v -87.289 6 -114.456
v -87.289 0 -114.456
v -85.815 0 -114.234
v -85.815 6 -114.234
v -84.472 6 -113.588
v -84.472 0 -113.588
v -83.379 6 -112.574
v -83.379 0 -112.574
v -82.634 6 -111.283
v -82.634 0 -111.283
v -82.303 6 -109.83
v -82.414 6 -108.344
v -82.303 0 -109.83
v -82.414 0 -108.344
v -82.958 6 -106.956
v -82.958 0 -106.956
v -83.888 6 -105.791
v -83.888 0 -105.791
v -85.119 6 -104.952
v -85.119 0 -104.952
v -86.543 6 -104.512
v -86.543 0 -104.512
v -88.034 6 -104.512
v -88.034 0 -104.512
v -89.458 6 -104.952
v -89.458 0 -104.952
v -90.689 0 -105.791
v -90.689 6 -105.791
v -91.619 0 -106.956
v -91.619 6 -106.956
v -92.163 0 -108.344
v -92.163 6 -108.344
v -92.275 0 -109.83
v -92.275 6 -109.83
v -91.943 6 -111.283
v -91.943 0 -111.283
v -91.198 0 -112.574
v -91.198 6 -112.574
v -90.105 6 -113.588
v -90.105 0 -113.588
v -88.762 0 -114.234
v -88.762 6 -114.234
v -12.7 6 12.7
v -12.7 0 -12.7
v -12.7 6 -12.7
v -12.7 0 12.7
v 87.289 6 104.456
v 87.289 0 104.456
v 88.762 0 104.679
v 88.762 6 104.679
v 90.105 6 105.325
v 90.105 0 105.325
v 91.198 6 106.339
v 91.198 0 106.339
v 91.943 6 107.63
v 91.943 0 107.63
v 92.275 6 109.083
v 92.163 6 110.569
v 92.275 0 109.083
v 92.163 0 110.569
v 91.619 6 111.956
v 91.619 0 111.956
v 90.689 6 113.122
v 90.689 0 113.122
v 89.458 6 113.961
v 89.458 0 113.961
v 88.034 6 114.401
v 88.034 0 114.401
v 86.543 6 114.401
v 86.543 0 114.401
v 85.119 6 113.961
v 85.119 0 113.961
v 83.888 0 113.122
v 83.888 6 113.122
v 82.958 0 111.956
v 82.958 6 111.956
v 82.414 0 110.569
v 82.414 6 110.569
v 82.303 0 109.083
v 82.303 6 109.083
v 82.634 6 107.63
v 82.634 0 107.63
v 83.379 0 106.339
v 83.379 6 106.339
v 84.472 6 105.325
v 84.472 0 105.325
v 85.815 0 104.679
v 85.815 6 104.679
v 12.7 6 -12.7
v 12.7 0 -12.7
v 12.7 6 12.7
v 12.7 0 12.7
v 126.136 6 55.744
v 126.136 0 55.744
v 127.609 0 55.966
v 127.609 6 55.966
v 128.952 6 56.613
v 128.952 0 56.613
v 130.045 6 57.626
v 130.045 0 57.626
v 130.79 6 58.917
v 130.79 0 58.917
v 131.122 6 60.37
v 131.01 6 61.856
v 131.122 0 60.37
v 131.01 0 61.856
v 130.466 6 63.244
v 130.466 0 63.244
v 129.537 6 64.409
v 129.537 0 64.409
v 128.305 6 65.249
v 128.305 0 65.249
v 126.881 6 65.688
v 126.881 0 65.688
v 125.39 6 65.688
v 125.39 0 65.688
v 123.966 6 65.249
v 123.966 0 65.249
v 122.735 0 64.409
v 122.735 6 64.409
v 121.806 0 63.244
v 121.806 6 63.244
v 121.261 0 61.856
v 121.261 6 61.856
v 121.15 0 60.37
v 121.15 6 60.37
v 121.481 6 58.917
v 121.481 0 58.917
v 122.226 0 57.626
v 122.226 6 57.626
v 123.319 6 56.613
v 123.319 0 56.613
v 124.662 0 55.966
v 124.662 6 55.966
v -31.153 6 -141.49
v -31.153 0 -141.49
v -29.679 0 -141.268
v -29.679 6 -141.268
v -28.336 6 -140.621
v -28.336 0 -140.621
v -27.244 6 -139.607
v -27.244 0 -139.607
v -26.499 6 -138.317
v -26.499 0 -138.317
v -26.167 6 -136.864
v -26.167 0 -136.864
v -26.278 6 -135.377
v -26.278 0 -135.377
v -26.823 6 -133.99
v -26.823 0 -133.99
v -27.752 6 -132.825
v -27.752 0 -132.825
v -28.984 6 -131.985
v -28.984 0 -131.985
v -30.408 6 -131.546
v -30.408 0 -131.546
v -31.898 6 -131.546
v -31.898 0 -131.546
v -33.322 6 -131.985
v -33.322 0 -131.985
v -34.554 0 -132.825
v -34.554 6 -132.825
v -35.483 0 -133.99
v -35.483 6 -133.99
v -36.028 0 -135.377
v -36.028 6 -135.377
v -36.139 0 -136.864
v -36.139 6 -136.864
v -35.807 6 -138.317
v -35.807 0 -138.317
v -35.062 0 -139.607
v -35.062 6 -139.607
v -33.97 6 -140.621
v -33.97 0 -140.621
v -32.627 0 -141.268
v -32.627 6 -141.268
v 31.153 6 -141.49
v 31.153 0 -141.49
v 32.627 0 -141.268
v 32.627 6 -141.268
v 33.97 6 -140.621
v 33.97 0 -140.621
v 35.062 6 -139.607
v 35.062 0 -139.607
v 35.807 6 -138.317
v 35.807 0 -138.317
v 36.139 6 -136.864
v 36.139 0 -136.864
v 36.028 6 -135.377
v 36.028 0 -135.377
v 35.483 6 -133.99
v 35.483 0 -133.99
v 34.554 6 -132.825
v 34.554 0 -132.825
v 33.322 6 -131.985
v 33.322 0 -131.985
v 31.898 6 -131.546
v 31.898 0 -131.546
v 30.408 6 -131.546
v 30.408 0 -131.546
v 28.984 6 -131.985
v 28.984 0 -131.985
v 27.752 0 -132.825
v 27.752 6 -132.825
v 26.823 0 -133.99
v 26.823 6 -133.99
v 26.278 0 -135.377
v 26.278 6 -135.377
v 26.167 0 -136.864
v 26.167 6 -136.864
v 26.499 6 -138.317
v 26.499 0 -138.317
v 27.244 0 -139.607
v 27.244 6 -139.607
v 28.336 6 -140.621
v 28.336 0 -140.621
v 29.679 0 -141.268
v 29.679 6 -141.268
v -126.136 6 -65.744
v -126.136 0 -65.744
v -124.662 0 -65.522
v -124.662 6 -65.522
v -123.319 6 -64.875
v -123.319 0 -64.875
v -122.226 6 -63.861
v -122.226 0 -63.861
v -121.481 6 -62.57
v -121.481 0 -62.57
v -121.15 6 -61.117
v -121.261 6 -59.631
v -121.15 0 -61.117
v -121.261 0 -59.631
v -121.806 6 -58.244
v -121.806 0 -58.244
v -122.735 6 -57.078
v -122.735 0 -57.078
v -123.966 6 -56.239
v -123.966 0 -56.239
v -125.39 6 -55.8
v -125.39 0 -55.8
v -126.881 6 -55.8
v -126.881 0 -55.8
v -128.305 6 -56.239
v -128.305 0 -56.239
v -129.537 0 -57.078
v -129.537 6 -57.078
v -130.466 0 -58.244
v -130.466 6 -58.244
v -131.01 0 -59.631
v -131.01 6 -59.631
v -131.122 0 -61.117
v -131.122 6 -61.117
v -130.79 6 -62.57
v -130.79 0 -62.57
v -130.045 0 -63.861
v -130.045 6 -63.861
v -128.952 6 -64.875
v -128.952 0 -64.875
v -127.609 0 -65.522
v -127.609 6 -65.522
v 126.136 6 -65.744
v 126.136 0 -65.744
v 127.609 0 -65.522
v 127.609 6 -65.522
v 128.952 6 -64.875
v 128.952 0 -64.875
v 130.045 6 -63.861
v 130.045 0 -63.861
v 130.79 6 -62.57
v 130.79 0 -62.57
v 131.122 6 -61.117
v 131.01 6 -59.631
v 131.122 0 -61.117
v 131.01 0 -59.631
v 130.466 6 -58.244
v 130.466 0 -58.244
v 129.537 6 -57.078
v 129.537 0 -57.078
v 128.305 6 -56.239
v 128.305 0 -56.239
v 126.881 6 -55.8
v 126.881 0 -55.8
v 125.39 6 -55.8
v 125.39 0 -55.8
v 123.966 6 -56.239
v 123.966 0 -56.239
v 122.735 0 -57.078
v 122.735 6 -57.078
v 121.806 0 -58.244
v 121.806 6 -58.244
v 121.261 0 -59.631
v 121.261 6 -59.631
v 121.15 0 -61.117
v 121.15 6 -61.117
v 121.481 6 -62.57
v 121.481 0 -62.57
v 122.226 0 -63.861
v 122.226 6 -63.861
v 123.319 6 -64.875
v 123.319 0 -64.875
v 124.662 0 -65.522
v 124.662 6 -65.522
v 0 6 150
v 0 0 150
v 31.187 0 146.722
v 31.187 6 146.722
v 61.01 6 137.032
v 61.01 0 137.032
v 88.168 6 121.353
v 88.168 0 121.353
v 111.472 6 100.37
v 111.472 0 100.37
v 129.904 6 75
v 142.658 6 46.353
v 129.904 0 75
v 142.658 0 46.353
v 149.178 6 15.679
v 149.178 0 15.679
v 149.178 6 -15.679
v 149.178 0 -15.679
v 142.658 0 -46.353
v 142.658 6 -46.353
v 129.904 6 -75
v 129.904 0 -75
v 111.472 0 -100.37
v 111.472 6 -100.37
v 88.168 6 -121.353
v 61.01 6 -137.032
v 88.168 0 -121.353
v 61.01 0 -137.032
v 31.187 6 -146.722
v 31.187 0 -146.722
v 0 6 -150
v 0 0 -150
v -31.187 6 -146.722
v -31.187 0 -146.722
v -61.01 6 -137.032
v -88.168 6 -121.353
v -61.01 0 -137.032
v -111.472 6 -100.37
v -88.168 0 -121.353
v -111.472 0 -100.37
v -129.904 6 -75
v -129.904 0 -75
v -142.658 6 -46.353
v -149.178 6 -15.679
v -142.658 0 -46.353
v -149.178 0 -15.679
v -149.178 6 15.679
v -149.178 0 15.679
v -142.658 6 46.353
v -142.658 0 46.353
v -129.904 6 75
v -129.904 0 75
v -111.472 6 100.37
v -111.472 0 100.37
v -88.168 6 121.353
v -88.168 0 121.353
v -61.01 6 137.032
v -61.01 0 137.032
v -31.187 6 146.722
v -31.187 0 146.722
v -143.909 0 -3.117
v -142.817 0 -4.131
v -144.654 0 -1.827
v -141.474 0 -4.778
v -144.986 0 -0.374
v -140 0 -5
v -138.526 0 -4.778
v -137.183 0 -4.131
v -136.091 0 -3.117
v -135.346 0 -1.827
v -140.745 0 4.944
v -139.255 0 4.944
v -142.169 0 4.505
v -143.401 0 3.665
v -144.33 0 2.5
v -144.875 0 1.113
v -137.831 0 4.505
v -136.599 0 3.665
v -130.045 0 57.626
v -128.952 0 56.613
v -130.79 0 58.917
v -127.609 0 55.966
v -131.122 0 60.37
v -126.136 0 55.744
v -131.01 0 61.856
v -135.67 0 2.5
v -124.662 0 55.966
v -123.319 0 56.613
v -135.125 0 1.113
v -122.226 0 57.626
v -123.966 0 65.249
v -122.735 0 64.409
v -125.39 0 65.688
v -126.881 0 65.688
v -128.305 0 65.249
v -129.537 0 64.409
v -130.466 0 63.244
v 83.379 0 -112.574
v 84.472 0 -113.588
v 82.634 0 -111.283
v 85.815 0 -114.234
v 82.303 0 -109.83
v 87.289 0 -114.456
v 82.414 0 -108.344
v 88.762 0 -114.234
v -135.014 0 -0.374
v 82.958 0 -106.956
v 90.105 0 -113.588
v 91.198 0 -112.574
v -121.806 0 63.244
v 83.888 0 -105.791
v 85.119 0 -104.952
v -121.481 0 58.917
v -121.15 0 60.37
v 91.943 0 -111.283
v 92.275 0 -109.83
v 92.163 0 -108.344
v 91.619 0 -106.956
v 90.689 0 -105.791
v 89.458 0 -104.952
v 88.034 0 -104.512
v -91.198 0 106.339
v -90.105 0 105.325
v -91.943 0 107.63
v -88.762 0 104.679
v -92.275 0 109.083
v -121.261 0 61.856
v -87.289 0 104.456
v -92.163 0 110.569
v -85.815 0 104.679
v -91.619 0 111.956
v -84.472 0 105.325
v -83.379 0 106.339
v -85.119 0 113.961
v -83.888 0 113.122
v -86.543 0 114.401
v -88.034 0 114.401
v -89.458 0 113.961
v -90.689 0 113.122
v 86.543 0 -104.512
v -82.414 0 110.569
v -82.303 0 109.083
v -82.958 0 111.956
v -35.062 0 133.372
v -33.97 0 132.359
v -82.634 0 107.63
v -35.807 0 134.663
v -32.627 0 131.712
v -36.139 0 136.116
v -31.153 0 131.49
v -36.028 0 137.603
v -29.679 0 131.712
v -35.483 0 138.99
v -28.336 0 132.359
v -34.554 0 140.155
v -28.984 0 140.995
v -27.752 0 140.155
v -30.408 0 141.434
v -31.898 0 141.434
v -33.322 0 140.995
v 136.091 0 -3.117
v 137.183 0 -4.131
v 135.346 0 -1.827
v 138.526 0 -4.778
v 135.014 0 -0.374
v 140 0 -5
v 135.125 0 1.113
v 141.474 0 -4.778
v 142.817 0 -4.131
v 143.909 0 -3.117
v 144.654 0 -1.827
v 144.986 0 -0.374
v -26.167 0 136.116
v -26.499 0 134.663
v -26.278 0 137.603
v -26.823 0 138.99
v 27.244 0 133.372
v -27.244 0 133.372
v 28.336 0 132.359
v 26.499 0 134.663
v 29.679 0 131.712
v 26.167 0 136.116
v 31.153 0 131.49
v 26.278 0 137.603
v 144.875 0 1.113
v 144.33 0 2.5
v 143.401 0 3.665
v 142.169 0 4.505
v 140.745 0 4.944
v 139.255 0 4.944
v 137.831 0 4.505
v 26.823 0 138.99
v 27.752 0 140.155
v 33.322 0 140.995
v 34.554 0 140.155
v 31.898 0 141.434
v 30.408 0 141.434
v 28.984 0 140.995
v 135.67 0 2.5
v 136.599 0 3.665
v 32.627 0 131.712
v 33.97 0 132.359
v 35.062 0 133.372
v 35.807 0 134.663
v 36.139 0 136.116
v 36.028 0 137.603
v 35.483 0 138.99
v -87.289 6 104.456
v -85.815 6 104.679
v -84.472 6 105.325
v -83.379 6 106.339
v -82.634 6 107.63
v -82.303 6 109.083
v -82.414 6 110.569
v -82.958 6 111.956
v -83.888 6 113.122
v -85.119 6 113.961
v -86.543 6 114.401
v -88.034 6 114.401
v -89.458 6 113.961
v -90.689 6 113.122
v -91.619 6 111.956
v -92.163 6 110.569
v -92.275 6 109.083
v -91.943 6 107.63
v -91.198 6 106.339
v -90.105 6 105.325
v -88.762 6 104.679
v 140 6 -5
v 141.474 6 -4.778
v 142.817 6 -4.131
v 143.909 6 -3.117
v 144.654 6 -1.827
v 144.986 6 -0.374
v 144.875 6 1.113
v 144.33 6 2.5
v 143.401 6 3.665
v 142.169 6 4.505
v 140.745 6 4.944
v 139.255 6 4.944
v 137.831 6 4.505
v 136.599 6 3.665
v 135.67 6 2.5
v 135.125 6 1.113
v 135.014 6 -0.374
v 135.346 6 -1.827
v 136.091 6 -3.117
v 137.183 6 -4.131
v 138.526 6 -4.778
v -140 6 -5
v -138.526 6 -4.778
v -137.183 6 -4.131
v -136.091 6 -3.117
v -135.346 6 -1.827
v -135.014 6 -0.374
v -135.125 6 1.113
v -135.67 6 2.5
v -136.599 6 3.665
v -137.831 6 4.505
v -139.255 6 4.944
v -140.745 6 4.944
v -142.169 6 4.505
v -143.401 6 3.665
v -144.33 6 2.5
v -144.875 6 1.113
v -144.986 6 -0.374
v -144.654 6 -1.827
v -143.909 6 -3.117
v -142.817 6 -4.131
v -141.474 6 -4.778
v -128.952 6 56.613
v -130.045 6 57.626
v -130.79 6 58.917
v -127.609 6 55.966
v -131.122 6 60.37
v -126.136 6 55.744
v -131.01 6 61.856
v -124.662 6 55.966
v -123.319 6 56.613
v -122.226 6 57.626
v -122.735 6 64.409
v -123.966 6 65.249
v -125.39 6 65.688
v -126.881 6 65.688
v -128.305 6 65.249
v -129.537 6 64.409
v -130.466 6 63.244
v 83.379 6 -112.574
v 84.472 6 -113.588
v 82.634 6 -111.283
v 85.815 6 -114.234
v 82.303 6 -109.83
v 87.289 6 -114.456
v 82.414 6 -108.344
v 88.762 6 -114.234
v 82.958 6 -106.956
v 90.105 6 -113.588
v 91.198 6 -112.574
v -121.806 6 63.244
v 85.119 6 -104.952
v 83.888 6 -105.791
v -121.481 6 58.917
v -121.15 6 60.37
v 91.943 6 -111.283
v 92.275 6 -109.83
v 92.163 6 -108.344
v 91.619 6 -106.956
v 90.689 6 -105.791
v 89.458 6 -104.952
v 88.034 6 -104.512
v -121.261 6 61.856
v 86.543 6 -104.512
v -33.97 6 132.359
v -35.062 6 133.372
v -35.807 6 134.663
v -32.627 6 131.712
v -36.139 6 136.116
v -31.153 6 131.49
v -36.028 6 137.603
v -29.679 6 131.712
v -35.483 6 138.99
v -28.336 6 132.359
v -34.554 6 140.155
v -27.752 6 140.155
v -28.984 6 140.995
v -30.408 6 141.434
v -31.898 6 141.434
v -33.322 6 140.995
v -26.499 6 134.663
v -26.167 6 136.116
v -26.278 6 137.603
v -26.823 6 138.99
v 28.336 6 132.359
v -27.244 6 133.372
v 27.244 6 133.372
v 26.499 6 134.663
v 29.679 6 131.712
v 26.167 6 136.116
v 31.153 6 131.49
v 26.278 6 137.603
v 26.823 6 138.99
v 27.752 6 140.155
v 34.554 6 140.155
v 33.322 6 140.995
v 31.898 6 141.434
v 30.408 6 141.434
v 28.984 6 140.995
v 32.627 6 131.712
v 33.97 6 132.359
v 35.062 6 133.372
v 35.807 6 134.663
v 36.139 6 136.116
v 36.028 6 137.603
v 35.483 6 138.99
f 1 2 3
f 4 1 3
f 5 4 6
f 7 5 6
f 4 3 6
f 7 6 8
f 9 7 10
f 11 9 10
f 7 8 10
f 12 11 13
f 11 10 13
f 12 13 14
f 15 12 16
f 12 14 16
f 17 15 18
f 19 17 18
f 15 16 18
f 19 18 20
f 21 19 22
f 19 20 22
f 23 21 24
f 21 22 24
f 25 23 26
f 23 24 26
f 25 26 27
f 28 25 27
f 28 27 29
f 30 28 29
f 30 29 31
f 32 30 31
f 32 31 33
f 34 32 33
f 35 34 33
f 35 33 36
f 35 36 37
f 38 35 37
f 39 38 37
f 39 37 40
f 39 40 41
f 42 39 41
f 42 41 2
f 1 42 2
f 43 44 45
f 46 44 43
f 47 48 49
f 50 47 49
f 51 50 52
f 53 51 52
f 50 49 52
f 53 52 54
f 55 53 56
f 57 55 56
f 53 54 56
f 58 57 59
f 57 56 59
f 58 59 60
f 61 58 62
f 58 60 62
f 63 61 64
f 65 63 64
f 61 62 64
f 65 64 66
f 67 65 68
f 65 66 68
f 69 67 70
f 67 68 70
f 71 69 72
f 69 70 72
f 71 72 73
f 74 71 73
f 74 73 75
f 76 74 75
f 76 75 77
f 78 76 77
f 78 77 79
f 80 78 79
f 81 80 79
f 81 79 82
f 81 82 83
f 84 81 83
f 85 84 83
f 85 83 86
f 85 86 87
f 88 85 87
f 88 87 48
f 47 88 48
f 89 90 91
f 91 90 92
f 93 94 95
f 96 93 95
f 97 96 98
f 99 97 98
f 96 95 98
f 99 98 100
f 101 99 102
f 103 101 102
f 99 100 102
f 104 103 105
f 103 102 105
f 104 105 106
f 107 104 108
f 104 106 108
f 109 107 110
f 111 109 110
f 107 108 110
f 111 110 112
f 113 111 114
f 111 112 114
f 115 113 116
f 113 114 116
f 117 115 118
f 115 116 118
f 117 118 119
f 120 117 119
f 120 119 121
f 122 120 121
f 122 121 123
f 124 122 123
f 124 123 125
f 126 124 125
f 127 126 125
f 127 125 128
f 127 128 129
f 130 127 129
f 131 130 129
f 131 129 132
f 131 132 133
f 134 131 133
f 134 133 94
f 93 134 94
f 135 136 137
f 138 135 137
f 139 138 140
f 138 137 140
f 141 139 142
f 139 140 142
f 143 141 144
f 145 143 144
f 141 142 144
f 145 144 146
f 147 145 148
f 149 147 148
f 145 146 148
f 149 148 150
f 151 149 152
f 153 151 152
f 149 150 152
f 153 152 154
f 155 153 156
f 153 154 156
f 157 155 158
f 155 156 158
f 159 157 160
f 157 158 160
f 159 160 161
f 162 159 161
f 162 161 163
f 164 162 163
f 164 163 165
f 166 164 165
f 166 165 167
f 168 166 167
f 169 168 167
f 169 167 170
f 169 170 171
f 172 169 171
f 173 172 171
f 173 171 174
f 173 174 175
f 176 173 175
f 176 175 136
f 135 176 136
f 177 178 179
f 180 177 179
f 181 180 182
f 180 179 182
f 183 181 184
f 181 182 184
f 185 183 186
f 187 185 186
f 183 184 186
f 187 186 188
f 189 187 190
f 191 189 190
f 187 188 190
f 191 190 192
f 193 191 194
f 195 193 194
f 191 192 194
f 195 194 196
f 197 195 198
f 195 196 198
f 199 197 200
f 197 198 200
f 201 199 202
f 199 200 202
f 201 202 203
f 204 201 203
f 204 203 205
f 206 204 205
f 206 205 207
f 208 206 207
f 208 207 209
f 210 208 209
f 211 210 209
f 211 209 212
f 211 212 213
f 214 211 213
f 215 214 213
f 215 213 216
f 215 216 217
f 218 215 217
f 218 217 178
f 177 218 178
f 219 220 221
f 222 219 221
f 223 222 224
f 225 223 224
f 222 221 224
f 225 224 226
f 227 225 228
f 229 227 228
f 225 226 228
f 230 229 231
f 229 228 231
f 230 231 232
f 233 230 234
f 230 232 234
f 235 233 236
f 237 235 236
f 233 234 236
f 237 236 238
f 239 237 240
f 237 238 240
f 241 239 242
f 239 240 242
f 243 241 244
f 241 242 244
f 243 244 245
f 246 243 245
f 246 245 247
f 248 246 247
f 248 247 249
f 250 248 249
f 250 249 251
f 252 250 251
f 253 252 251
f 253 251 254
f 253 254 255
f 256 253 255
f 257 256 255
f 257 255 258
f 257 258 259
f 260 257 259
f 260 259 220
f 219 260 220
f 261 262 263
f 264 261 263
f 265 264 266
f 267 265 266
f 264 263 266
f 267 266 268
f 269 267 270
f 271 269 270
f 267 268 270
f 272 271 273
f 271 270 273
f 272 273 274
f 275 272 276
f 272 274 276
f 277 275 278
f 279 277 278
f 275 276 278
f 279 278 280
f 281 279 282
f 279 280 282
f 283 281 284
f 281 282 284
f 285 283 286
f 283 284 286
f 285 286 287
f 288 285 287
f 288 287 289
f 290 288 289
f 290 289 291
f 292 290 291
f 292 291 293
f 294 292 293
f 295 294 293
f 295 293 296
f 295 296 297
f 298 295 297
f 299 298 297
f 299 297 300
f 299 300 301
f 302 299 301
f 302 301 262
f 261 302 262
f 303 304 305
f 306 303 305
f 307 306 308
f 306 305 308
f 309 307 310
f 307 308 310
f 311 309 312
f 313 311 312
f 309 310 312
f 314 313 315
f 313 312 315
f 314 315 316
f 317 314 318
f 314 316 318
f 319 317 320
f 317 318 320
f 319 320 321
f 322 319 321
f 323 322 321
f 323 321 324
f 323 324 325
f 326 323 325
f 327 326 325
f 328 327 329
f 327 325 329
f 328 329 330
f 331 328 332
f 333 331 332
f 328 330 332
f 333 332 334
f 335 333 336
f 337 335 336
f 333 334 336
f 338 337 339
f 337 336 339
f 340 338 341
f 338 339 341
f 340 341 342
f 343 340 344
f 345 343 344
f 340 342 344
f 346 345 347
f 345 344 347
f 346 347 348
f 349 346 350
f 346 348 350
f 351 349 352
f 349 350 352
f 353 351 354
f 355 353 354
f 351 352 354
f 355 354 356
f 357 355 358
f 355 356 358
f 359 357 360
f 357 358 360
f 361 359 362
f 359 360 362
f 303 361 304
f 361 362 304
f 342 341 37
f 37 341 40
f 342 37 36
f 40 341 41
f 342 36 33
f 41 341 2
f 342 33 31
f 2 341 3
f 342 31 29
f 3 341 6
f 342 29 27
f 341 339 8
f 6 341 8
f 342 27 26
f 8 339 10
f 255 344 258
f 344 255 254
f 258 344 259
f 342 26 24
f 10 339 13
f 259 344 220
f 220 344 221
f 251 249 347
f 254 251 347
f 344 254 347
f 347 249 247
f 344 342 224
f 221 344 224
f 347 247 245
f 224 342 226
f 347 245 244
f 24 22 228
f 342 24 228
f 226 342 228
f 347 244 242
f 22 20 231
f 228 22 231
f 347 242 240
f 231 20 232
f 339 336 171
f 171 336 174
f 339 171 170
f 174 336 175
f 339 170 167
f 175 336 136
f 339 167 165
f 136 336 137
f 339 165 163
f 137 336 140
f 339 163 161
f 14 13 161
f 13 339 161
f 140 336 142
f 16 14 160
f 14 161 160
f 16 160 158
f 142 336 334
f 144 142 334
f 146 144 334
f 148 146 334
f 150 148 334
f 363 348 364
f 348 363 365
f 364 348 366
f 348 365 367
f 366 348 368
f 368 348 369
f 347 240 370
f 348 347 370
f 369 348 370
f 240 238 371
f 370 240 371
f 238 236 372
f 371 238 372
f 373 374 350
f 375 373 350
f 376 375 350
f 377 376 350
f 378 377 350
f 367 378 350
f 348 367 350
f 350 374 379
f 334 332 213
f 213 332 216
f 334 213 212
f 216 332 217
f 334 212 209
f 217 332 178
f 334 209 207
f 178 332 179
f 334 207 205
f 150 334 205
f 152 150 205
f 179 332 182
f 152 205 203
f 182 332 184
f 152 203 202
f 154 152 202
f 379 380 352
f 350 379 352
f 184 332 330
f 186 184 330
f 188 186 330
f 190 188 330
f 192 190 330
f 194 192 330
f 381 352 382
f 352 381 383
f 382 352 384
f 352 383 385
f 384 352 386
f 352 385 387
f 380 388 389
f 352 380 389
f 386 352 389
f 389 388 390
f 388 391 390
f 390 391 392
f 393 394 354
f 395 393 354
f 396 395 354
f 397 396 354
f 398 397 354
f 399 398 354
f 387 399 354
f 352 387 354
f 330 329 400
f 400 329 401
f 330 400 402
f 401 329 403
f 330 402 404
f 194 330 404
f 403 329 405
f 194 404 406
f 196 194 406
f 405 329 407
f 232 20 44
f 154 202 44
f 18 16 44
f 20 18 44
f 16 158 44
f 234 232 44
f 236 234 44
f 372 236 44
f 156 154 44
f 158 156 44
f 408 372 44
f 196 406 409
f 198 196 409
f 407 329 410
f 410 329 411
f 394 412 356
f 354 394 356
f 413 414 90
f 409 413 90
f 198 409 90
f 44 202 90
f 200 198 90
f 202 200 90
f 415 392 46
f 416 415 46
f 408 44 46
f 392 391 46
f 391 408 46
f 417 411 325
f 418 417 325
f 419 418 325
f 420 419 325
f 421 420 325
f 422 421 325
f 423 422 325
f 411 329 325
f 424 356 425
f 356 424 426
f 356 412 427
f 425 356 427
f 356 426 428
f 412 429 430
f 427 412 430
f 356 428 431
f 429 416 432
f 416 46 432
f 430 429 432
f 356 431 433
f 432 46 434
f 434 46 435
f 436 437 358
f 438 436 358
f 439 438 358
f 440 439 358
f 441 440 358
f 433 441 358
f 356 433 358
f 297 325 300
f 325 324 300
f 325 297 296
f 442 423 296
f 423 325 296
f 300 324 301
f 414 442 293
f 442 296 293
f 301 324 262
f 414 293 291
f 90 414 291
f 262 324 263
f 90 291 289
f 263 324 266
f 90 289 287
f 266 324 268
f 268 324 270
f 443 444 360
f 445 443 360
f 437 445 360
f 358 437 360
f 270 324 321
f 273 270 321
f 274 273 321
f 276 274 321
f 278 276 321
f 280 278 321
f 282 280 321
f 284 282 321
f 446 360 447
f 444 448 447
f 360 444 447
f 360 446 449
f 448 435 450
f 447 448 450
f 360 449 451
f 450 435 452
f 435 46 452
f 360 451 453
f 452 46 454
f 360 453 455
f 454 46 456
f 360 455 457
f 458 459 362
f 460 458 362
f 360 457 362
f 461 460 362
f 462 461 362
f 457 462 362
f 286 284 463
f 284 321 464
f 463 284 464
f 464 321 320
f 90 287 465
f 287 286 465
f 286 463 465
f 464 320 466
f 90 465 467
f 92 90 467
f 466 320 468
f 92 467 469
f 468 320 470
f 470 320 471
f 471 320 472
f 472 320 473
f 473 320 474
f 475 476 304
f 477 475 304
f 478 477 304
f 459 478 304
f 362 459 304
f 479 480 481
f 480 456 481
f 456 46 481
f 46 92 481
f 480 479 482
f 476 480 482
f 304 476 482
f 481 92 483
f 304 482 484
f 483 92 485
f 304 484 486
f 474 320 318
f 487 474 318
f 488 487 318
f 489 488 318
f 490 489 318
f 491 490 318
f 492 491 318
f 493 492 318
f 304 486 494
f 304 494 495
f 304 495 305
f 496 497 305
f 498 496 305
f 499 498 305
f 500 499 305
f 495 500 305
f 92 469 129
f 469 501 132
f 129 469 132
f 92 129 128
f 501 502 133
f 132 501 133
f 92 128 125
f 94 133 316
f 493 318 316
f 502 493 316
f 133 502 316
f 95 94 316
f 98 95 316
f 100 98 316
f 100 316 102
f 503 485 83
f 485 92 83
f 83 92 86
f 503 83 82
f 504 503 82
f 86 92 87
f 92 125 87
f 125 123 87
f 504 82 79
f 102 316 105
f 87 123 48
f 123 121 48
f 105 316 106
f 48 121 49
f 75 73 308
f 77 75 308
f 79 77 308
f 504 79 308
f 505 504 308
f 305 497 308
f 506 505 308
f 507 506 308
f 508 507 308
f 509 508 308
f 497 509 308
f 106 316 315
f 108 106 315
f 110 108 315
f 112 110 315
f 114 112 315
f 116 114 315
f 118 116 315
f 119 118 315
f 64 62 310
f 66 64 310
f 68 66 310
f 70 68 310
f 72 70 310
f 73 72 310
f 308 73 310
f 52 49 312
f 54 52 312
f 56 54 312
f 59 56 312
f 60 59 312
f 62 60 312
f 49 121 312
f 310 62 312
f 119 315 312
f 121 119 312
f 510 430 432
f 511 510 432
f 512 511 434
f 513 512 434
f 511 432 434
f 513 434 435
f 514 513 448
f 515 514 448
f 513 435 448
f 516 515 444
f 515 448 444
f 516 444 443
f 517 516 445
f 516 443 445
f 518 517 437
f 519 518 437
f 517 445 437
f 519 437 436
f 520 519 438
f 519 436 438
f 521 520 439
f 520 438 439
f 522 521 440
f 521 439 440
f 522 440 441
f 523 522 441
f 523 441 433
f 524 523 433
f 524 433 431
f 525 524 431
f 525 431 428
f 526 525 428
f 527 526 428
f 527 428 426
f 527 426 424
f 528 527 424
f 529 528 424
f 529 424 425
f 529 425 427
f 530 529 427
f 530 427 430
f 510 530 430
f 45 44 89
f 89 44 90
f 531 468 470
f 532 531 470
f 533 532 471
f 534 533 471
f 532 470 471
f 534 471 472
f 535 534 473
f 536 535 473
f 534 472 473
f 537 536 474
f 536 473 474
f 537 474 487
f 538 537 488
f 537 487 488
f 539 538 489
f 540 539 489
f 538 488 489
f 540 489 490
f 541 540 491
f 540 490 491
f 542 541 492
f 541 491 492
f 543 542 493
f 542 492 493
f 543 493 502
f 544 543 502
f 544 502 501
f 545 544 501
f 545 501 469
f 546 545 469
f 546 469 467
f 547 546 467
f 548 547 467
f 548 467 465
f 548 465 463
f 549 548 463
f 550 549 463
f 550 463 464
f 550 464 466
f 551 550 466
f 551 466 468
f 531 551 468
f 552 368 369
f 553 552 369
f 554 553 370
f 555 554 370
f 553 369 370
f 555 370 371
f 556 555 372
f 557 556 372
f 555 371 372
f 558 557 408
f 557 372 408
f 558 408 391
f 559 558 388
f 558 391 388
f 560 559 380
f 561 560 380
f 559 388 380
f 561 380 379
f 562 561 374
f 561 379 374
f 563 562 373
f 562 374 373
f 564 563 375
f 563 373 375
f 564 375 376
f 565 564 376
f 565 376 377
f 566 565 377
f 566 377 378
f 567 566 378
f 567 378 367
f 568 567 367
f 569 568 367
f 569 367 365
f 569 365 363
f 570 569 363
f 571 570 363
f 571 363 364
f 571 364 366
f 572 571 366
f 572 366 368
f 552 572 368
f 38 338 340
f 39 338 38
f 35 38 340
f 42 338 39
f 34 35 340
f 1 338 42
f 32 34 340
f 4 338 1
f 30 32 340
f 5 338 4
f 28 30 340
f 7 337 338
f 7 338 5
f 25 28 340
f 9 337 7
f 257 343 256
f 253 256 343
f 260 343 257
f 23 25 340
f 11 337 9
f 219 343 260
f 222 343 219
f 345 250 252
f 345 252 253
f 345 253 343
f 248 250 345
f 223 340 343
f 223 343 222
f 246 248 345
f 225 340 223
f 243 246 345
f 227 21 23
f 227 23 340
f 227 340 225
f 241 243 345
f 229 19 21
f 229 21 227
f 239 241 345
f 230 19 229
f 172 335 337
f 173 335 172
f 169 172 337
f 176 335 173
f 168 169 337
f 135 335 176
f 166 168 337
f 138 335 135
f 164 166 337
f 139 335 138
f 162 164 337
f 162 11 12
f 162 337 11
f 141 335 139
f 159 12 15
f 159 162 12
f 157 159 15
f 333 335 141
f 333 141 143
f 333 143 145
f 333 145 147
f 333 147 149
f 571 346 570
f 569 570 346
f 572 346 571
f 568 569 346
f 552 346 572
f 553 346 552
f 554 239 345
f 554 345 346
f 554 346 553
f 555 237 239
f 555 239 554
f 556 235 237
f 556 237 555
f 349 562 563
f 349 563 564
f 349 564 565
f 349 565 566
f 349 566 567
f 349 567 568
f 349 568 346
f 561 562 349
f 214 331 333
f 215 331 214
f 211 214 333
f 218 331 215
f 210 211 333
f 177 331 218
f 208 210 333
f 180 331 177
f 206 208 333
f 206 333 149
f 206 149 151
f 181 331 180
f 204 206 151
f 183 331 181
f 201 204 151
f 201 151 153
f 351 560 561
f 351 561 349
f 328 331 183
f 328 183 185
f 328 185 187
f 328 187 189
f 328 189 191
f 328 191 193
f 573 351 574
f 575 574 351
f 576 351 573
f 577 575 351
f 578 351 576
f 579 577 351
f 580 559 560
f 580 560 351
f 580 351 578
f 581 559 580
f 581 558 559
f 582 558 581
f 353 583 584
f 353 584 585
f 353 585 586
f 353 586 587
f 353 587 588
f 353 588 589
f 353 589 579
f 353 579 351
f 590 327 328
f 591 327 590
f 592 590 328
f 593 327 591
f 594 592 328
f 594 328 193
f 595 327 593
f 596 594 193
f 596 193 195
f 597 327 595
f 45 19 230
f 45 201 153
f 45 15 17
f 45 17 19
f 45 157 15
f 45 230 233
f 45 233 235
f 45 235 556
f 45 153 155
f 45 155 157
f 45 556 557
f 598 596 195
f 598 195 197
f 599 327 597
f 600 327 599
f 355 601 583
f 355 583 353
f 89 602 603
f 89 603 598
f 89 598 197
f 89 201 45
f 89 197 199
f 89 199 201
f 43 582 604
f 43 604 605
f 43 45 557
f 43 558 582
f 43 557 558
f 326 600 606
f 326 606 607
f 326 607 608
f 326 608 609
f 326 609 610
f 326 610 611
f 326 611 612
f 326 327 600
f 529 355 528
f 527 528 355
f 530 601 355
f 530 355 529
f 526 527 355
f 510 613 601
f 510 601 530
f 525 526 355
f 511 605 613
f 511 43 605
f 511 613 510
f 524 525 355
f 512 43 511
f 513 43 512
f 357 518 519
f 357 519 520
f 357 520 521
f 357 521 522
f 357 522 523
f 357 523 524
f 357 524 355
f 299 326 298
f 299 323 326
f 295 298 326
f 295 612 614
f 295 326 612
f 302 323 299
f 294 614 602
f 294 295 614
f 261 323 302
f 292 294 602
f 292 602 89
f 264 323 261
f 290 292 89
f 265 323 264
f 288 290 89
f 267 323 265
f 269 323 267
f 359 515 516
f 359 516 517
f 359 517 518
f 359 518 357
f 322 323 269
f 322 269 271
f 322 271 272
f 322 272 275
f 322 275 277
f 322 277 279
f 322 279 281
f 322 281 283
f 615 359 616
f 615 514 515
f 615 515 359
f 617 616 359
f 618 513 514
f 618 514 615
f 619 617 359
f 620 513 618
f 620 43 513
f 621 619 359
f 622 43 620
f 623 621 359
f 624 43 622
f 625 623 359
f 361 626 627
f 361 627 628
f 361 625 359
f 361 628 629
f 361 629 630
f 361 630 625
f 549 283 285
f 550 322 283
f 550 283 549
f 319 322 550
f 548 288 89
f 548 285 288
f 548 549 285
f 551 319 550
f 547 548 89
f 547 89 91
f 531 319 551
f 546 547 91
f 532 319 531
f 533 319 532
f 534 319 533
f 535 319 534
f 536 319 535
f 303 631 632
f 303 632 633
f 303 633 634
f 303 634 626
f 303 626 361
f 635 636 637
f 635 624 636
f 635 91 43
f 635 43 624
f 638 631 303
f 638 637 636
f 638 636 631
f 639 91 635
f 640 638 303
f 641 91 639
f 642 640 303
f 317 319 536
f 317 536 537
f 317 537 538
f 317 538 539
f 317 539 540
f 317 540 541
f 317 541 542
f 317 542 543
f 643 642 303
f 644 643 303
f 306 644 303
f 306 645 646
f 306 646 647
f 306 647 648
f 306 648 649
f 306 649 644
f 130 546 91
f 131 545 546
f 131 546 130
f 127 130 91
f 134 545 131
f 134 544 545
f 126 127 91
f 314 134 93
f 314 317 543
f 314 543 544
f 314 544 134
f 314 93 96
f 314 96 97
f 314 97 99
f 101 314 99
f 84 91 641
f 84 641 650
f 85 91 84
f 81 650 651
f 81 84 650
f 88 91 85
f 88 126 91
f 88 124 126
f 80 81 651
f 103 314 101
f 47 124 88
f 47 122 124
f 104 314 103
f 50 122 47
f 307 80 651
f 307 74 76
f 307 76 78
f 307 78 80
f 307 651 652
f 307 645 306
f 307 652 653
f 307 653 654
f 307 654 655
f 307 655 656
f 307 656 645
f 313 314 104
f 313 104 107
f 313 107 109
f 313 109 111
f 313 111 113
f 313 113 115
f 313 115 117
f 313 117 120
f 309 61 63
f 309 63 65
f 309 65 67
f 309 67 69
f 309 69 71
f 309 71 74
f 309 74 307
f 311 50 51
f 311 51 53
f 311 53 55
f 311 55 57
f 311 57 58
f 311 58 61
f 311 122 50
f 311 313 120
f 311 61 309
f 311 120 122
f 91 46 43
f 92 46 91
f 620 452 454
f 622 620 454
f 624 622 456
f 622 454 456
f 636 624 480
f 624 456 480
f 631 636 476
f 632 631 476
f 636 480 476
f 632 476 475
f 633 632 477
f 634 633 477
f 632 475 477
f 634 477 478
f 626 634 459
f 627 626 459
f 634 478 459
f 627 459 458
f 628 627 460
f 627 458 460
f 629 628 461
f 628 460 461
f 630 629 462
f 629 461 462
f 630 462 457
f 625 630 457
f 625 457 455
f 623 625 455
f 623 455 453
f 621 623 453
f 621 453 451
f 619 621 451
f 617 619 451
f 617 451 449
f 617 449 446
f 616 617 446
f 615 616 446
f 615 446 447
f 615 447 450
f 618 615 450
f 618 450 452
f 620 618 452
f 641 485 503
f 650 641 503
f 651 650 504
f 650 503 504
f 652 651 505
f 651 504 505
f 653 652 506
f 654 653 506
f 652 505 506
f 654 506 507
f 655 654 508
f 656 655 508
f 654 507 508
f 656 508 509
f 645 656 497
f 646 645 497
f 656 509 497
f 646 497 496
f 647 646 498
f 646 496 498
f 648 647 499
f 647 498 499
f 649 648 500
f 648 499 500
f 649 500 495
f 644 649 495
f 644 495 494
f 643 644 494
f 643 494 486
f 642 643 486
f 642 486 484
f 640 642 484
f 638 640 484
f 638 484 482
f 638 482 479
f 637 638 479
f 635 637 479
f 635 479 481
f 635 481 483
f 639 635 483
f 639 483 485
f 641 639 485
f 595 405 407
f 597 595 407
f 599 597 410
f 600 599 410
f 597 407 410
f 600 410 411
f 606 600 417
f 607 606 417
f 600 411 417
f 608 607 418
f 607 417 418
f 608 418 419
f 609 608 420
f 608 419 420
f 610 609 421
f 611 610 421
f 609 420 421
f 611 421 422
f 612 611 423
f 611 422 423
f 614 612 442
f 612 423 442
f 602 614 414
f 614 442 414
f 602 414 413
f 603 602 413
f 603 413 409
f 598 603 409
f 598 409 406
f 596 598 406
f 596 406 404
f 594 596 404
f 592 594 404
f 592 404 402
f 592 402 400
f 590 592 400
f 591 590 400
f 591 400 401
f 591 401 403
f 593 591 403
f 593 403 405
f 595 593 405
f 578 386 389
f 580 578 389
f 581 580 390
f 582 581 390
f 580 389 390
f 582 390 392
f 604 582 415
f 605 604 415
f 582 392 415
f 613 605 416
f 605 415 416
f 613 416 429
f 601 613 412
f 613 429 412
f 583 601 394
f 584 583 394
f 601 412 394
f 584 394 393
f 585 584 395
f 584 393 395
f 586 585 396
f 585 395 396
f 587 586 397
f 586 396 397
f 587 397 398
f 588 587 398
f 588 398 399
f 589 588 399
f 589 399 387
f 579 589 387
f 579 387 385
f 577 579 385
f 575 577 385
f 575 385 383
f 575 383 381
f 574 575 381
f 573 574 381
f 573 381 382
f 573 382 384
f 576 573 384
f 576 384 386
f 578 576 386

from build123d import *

# Parameters (mm, degrees)
CROQUIS1_R              = 150
SALIENTE_EXTRUIR1_DEPTH = 6
CROQUIS2_R              = 5
CORTAR_EXTRUIR1_DEPTH   = 213.216870206
CROQUIS4_W              = 25.4
CROQUIS4_H              = 25.4
CORTAR_EXTRUIR2_DEPTH   = 213.216870206


with BuildPart() as part:
    # Croquis1 → Saliente-Extruir1 (new body)
    with BuildSketch(Plane(origin=(0, 0, 0), x_dir=(1, 0, 0), z_dir=(0, 1, 0))):
        with Locations(Location((0, 0, 0), (0, 0, 270))):
            Circle(CROQUIS1_R)
    extrude(amount=SALIENTE_EXTRUIR1_DEPTH)

    # Croquis2 → Cortar-Extruir1 (cut, through all)
    with BuildSketch(Plane.XZ):
        with Locations(Location((140, 0, 0), (0, 0, 270))):
            Circle(CROQUIS2_R)
        with Locations(Location((126.135641506, -60.743723476, 0), (0, 0, 270))):
            Circle(CROQUIS2_R)
        with Locations(Location((87.28857226, -109.456407546, 0), (0, 0, 270))):
            Circle(CROQUIS2_R)
        with Locations(Location((31.152930754, -136.489907705, 0), (0, 0, 270))):
            Circle(CROQUIS2_R)
        with Locations(Location((-31.152930754, -136.489907705, 0), (0, 0, 270))):
            Circle(CROQUIS2_R)
        with Locations(Location((-87.28857226, -109.456407546, 0), (0, 0, 270))):
            Circle(CROQUIS2_R)
        with Locations(Location((-126.135641506, -60.743723476, 0), (0, 0, 270))):
            Circle(CROQUIS2_R)
        with Locations(Location((-140, 0, 0), (0, 0, 270))):
            Circle(CROQUIS2_R)
        with Locations(Location((-126.135641506, 60.743723476, 0), (0, 0, 270))):
            Circle(CROQUIS2_R)
        with Locations(Location((-87.28857226, 109.456407546, 0), (0, 0, 270))):
            Circle(CROQUIS2_R)
        with Locations(Location((-31.152930754, 136.489907705, 0), (0, 0, 270))):
            Circle(CROQUIS2_R)
        with Locations(Location((31.152930754, 136.489907705, 0), (0, 0, 270))):
            Circle(CROQUIS2_R)
        with Locations(Location((87.28857226, 109.456407546, 0), (0, 0, 270))):
            Circle(CROQUIS2_R)
        with Locations(Location((126.135641506, 60.743723476, 0), (0, 0, 270))):
            Circle(CROQUIS2_R)
    extrude(amount=-CORTAR_EXTRUIR1_DEPTH, mode=Mode.SUBTRACT)

    # Croquis4 → Cortar-Extruir2 (cut, through all)
    with BuildSketch(Plane.XZ):
        Rectangle(CROQUIS4_W, CROQUIS4_H)
    extrude(amount=-CORTAR_EXTRUIR2_DEPTH, mode=Mode.SUBTRACT)


solid = part.part
